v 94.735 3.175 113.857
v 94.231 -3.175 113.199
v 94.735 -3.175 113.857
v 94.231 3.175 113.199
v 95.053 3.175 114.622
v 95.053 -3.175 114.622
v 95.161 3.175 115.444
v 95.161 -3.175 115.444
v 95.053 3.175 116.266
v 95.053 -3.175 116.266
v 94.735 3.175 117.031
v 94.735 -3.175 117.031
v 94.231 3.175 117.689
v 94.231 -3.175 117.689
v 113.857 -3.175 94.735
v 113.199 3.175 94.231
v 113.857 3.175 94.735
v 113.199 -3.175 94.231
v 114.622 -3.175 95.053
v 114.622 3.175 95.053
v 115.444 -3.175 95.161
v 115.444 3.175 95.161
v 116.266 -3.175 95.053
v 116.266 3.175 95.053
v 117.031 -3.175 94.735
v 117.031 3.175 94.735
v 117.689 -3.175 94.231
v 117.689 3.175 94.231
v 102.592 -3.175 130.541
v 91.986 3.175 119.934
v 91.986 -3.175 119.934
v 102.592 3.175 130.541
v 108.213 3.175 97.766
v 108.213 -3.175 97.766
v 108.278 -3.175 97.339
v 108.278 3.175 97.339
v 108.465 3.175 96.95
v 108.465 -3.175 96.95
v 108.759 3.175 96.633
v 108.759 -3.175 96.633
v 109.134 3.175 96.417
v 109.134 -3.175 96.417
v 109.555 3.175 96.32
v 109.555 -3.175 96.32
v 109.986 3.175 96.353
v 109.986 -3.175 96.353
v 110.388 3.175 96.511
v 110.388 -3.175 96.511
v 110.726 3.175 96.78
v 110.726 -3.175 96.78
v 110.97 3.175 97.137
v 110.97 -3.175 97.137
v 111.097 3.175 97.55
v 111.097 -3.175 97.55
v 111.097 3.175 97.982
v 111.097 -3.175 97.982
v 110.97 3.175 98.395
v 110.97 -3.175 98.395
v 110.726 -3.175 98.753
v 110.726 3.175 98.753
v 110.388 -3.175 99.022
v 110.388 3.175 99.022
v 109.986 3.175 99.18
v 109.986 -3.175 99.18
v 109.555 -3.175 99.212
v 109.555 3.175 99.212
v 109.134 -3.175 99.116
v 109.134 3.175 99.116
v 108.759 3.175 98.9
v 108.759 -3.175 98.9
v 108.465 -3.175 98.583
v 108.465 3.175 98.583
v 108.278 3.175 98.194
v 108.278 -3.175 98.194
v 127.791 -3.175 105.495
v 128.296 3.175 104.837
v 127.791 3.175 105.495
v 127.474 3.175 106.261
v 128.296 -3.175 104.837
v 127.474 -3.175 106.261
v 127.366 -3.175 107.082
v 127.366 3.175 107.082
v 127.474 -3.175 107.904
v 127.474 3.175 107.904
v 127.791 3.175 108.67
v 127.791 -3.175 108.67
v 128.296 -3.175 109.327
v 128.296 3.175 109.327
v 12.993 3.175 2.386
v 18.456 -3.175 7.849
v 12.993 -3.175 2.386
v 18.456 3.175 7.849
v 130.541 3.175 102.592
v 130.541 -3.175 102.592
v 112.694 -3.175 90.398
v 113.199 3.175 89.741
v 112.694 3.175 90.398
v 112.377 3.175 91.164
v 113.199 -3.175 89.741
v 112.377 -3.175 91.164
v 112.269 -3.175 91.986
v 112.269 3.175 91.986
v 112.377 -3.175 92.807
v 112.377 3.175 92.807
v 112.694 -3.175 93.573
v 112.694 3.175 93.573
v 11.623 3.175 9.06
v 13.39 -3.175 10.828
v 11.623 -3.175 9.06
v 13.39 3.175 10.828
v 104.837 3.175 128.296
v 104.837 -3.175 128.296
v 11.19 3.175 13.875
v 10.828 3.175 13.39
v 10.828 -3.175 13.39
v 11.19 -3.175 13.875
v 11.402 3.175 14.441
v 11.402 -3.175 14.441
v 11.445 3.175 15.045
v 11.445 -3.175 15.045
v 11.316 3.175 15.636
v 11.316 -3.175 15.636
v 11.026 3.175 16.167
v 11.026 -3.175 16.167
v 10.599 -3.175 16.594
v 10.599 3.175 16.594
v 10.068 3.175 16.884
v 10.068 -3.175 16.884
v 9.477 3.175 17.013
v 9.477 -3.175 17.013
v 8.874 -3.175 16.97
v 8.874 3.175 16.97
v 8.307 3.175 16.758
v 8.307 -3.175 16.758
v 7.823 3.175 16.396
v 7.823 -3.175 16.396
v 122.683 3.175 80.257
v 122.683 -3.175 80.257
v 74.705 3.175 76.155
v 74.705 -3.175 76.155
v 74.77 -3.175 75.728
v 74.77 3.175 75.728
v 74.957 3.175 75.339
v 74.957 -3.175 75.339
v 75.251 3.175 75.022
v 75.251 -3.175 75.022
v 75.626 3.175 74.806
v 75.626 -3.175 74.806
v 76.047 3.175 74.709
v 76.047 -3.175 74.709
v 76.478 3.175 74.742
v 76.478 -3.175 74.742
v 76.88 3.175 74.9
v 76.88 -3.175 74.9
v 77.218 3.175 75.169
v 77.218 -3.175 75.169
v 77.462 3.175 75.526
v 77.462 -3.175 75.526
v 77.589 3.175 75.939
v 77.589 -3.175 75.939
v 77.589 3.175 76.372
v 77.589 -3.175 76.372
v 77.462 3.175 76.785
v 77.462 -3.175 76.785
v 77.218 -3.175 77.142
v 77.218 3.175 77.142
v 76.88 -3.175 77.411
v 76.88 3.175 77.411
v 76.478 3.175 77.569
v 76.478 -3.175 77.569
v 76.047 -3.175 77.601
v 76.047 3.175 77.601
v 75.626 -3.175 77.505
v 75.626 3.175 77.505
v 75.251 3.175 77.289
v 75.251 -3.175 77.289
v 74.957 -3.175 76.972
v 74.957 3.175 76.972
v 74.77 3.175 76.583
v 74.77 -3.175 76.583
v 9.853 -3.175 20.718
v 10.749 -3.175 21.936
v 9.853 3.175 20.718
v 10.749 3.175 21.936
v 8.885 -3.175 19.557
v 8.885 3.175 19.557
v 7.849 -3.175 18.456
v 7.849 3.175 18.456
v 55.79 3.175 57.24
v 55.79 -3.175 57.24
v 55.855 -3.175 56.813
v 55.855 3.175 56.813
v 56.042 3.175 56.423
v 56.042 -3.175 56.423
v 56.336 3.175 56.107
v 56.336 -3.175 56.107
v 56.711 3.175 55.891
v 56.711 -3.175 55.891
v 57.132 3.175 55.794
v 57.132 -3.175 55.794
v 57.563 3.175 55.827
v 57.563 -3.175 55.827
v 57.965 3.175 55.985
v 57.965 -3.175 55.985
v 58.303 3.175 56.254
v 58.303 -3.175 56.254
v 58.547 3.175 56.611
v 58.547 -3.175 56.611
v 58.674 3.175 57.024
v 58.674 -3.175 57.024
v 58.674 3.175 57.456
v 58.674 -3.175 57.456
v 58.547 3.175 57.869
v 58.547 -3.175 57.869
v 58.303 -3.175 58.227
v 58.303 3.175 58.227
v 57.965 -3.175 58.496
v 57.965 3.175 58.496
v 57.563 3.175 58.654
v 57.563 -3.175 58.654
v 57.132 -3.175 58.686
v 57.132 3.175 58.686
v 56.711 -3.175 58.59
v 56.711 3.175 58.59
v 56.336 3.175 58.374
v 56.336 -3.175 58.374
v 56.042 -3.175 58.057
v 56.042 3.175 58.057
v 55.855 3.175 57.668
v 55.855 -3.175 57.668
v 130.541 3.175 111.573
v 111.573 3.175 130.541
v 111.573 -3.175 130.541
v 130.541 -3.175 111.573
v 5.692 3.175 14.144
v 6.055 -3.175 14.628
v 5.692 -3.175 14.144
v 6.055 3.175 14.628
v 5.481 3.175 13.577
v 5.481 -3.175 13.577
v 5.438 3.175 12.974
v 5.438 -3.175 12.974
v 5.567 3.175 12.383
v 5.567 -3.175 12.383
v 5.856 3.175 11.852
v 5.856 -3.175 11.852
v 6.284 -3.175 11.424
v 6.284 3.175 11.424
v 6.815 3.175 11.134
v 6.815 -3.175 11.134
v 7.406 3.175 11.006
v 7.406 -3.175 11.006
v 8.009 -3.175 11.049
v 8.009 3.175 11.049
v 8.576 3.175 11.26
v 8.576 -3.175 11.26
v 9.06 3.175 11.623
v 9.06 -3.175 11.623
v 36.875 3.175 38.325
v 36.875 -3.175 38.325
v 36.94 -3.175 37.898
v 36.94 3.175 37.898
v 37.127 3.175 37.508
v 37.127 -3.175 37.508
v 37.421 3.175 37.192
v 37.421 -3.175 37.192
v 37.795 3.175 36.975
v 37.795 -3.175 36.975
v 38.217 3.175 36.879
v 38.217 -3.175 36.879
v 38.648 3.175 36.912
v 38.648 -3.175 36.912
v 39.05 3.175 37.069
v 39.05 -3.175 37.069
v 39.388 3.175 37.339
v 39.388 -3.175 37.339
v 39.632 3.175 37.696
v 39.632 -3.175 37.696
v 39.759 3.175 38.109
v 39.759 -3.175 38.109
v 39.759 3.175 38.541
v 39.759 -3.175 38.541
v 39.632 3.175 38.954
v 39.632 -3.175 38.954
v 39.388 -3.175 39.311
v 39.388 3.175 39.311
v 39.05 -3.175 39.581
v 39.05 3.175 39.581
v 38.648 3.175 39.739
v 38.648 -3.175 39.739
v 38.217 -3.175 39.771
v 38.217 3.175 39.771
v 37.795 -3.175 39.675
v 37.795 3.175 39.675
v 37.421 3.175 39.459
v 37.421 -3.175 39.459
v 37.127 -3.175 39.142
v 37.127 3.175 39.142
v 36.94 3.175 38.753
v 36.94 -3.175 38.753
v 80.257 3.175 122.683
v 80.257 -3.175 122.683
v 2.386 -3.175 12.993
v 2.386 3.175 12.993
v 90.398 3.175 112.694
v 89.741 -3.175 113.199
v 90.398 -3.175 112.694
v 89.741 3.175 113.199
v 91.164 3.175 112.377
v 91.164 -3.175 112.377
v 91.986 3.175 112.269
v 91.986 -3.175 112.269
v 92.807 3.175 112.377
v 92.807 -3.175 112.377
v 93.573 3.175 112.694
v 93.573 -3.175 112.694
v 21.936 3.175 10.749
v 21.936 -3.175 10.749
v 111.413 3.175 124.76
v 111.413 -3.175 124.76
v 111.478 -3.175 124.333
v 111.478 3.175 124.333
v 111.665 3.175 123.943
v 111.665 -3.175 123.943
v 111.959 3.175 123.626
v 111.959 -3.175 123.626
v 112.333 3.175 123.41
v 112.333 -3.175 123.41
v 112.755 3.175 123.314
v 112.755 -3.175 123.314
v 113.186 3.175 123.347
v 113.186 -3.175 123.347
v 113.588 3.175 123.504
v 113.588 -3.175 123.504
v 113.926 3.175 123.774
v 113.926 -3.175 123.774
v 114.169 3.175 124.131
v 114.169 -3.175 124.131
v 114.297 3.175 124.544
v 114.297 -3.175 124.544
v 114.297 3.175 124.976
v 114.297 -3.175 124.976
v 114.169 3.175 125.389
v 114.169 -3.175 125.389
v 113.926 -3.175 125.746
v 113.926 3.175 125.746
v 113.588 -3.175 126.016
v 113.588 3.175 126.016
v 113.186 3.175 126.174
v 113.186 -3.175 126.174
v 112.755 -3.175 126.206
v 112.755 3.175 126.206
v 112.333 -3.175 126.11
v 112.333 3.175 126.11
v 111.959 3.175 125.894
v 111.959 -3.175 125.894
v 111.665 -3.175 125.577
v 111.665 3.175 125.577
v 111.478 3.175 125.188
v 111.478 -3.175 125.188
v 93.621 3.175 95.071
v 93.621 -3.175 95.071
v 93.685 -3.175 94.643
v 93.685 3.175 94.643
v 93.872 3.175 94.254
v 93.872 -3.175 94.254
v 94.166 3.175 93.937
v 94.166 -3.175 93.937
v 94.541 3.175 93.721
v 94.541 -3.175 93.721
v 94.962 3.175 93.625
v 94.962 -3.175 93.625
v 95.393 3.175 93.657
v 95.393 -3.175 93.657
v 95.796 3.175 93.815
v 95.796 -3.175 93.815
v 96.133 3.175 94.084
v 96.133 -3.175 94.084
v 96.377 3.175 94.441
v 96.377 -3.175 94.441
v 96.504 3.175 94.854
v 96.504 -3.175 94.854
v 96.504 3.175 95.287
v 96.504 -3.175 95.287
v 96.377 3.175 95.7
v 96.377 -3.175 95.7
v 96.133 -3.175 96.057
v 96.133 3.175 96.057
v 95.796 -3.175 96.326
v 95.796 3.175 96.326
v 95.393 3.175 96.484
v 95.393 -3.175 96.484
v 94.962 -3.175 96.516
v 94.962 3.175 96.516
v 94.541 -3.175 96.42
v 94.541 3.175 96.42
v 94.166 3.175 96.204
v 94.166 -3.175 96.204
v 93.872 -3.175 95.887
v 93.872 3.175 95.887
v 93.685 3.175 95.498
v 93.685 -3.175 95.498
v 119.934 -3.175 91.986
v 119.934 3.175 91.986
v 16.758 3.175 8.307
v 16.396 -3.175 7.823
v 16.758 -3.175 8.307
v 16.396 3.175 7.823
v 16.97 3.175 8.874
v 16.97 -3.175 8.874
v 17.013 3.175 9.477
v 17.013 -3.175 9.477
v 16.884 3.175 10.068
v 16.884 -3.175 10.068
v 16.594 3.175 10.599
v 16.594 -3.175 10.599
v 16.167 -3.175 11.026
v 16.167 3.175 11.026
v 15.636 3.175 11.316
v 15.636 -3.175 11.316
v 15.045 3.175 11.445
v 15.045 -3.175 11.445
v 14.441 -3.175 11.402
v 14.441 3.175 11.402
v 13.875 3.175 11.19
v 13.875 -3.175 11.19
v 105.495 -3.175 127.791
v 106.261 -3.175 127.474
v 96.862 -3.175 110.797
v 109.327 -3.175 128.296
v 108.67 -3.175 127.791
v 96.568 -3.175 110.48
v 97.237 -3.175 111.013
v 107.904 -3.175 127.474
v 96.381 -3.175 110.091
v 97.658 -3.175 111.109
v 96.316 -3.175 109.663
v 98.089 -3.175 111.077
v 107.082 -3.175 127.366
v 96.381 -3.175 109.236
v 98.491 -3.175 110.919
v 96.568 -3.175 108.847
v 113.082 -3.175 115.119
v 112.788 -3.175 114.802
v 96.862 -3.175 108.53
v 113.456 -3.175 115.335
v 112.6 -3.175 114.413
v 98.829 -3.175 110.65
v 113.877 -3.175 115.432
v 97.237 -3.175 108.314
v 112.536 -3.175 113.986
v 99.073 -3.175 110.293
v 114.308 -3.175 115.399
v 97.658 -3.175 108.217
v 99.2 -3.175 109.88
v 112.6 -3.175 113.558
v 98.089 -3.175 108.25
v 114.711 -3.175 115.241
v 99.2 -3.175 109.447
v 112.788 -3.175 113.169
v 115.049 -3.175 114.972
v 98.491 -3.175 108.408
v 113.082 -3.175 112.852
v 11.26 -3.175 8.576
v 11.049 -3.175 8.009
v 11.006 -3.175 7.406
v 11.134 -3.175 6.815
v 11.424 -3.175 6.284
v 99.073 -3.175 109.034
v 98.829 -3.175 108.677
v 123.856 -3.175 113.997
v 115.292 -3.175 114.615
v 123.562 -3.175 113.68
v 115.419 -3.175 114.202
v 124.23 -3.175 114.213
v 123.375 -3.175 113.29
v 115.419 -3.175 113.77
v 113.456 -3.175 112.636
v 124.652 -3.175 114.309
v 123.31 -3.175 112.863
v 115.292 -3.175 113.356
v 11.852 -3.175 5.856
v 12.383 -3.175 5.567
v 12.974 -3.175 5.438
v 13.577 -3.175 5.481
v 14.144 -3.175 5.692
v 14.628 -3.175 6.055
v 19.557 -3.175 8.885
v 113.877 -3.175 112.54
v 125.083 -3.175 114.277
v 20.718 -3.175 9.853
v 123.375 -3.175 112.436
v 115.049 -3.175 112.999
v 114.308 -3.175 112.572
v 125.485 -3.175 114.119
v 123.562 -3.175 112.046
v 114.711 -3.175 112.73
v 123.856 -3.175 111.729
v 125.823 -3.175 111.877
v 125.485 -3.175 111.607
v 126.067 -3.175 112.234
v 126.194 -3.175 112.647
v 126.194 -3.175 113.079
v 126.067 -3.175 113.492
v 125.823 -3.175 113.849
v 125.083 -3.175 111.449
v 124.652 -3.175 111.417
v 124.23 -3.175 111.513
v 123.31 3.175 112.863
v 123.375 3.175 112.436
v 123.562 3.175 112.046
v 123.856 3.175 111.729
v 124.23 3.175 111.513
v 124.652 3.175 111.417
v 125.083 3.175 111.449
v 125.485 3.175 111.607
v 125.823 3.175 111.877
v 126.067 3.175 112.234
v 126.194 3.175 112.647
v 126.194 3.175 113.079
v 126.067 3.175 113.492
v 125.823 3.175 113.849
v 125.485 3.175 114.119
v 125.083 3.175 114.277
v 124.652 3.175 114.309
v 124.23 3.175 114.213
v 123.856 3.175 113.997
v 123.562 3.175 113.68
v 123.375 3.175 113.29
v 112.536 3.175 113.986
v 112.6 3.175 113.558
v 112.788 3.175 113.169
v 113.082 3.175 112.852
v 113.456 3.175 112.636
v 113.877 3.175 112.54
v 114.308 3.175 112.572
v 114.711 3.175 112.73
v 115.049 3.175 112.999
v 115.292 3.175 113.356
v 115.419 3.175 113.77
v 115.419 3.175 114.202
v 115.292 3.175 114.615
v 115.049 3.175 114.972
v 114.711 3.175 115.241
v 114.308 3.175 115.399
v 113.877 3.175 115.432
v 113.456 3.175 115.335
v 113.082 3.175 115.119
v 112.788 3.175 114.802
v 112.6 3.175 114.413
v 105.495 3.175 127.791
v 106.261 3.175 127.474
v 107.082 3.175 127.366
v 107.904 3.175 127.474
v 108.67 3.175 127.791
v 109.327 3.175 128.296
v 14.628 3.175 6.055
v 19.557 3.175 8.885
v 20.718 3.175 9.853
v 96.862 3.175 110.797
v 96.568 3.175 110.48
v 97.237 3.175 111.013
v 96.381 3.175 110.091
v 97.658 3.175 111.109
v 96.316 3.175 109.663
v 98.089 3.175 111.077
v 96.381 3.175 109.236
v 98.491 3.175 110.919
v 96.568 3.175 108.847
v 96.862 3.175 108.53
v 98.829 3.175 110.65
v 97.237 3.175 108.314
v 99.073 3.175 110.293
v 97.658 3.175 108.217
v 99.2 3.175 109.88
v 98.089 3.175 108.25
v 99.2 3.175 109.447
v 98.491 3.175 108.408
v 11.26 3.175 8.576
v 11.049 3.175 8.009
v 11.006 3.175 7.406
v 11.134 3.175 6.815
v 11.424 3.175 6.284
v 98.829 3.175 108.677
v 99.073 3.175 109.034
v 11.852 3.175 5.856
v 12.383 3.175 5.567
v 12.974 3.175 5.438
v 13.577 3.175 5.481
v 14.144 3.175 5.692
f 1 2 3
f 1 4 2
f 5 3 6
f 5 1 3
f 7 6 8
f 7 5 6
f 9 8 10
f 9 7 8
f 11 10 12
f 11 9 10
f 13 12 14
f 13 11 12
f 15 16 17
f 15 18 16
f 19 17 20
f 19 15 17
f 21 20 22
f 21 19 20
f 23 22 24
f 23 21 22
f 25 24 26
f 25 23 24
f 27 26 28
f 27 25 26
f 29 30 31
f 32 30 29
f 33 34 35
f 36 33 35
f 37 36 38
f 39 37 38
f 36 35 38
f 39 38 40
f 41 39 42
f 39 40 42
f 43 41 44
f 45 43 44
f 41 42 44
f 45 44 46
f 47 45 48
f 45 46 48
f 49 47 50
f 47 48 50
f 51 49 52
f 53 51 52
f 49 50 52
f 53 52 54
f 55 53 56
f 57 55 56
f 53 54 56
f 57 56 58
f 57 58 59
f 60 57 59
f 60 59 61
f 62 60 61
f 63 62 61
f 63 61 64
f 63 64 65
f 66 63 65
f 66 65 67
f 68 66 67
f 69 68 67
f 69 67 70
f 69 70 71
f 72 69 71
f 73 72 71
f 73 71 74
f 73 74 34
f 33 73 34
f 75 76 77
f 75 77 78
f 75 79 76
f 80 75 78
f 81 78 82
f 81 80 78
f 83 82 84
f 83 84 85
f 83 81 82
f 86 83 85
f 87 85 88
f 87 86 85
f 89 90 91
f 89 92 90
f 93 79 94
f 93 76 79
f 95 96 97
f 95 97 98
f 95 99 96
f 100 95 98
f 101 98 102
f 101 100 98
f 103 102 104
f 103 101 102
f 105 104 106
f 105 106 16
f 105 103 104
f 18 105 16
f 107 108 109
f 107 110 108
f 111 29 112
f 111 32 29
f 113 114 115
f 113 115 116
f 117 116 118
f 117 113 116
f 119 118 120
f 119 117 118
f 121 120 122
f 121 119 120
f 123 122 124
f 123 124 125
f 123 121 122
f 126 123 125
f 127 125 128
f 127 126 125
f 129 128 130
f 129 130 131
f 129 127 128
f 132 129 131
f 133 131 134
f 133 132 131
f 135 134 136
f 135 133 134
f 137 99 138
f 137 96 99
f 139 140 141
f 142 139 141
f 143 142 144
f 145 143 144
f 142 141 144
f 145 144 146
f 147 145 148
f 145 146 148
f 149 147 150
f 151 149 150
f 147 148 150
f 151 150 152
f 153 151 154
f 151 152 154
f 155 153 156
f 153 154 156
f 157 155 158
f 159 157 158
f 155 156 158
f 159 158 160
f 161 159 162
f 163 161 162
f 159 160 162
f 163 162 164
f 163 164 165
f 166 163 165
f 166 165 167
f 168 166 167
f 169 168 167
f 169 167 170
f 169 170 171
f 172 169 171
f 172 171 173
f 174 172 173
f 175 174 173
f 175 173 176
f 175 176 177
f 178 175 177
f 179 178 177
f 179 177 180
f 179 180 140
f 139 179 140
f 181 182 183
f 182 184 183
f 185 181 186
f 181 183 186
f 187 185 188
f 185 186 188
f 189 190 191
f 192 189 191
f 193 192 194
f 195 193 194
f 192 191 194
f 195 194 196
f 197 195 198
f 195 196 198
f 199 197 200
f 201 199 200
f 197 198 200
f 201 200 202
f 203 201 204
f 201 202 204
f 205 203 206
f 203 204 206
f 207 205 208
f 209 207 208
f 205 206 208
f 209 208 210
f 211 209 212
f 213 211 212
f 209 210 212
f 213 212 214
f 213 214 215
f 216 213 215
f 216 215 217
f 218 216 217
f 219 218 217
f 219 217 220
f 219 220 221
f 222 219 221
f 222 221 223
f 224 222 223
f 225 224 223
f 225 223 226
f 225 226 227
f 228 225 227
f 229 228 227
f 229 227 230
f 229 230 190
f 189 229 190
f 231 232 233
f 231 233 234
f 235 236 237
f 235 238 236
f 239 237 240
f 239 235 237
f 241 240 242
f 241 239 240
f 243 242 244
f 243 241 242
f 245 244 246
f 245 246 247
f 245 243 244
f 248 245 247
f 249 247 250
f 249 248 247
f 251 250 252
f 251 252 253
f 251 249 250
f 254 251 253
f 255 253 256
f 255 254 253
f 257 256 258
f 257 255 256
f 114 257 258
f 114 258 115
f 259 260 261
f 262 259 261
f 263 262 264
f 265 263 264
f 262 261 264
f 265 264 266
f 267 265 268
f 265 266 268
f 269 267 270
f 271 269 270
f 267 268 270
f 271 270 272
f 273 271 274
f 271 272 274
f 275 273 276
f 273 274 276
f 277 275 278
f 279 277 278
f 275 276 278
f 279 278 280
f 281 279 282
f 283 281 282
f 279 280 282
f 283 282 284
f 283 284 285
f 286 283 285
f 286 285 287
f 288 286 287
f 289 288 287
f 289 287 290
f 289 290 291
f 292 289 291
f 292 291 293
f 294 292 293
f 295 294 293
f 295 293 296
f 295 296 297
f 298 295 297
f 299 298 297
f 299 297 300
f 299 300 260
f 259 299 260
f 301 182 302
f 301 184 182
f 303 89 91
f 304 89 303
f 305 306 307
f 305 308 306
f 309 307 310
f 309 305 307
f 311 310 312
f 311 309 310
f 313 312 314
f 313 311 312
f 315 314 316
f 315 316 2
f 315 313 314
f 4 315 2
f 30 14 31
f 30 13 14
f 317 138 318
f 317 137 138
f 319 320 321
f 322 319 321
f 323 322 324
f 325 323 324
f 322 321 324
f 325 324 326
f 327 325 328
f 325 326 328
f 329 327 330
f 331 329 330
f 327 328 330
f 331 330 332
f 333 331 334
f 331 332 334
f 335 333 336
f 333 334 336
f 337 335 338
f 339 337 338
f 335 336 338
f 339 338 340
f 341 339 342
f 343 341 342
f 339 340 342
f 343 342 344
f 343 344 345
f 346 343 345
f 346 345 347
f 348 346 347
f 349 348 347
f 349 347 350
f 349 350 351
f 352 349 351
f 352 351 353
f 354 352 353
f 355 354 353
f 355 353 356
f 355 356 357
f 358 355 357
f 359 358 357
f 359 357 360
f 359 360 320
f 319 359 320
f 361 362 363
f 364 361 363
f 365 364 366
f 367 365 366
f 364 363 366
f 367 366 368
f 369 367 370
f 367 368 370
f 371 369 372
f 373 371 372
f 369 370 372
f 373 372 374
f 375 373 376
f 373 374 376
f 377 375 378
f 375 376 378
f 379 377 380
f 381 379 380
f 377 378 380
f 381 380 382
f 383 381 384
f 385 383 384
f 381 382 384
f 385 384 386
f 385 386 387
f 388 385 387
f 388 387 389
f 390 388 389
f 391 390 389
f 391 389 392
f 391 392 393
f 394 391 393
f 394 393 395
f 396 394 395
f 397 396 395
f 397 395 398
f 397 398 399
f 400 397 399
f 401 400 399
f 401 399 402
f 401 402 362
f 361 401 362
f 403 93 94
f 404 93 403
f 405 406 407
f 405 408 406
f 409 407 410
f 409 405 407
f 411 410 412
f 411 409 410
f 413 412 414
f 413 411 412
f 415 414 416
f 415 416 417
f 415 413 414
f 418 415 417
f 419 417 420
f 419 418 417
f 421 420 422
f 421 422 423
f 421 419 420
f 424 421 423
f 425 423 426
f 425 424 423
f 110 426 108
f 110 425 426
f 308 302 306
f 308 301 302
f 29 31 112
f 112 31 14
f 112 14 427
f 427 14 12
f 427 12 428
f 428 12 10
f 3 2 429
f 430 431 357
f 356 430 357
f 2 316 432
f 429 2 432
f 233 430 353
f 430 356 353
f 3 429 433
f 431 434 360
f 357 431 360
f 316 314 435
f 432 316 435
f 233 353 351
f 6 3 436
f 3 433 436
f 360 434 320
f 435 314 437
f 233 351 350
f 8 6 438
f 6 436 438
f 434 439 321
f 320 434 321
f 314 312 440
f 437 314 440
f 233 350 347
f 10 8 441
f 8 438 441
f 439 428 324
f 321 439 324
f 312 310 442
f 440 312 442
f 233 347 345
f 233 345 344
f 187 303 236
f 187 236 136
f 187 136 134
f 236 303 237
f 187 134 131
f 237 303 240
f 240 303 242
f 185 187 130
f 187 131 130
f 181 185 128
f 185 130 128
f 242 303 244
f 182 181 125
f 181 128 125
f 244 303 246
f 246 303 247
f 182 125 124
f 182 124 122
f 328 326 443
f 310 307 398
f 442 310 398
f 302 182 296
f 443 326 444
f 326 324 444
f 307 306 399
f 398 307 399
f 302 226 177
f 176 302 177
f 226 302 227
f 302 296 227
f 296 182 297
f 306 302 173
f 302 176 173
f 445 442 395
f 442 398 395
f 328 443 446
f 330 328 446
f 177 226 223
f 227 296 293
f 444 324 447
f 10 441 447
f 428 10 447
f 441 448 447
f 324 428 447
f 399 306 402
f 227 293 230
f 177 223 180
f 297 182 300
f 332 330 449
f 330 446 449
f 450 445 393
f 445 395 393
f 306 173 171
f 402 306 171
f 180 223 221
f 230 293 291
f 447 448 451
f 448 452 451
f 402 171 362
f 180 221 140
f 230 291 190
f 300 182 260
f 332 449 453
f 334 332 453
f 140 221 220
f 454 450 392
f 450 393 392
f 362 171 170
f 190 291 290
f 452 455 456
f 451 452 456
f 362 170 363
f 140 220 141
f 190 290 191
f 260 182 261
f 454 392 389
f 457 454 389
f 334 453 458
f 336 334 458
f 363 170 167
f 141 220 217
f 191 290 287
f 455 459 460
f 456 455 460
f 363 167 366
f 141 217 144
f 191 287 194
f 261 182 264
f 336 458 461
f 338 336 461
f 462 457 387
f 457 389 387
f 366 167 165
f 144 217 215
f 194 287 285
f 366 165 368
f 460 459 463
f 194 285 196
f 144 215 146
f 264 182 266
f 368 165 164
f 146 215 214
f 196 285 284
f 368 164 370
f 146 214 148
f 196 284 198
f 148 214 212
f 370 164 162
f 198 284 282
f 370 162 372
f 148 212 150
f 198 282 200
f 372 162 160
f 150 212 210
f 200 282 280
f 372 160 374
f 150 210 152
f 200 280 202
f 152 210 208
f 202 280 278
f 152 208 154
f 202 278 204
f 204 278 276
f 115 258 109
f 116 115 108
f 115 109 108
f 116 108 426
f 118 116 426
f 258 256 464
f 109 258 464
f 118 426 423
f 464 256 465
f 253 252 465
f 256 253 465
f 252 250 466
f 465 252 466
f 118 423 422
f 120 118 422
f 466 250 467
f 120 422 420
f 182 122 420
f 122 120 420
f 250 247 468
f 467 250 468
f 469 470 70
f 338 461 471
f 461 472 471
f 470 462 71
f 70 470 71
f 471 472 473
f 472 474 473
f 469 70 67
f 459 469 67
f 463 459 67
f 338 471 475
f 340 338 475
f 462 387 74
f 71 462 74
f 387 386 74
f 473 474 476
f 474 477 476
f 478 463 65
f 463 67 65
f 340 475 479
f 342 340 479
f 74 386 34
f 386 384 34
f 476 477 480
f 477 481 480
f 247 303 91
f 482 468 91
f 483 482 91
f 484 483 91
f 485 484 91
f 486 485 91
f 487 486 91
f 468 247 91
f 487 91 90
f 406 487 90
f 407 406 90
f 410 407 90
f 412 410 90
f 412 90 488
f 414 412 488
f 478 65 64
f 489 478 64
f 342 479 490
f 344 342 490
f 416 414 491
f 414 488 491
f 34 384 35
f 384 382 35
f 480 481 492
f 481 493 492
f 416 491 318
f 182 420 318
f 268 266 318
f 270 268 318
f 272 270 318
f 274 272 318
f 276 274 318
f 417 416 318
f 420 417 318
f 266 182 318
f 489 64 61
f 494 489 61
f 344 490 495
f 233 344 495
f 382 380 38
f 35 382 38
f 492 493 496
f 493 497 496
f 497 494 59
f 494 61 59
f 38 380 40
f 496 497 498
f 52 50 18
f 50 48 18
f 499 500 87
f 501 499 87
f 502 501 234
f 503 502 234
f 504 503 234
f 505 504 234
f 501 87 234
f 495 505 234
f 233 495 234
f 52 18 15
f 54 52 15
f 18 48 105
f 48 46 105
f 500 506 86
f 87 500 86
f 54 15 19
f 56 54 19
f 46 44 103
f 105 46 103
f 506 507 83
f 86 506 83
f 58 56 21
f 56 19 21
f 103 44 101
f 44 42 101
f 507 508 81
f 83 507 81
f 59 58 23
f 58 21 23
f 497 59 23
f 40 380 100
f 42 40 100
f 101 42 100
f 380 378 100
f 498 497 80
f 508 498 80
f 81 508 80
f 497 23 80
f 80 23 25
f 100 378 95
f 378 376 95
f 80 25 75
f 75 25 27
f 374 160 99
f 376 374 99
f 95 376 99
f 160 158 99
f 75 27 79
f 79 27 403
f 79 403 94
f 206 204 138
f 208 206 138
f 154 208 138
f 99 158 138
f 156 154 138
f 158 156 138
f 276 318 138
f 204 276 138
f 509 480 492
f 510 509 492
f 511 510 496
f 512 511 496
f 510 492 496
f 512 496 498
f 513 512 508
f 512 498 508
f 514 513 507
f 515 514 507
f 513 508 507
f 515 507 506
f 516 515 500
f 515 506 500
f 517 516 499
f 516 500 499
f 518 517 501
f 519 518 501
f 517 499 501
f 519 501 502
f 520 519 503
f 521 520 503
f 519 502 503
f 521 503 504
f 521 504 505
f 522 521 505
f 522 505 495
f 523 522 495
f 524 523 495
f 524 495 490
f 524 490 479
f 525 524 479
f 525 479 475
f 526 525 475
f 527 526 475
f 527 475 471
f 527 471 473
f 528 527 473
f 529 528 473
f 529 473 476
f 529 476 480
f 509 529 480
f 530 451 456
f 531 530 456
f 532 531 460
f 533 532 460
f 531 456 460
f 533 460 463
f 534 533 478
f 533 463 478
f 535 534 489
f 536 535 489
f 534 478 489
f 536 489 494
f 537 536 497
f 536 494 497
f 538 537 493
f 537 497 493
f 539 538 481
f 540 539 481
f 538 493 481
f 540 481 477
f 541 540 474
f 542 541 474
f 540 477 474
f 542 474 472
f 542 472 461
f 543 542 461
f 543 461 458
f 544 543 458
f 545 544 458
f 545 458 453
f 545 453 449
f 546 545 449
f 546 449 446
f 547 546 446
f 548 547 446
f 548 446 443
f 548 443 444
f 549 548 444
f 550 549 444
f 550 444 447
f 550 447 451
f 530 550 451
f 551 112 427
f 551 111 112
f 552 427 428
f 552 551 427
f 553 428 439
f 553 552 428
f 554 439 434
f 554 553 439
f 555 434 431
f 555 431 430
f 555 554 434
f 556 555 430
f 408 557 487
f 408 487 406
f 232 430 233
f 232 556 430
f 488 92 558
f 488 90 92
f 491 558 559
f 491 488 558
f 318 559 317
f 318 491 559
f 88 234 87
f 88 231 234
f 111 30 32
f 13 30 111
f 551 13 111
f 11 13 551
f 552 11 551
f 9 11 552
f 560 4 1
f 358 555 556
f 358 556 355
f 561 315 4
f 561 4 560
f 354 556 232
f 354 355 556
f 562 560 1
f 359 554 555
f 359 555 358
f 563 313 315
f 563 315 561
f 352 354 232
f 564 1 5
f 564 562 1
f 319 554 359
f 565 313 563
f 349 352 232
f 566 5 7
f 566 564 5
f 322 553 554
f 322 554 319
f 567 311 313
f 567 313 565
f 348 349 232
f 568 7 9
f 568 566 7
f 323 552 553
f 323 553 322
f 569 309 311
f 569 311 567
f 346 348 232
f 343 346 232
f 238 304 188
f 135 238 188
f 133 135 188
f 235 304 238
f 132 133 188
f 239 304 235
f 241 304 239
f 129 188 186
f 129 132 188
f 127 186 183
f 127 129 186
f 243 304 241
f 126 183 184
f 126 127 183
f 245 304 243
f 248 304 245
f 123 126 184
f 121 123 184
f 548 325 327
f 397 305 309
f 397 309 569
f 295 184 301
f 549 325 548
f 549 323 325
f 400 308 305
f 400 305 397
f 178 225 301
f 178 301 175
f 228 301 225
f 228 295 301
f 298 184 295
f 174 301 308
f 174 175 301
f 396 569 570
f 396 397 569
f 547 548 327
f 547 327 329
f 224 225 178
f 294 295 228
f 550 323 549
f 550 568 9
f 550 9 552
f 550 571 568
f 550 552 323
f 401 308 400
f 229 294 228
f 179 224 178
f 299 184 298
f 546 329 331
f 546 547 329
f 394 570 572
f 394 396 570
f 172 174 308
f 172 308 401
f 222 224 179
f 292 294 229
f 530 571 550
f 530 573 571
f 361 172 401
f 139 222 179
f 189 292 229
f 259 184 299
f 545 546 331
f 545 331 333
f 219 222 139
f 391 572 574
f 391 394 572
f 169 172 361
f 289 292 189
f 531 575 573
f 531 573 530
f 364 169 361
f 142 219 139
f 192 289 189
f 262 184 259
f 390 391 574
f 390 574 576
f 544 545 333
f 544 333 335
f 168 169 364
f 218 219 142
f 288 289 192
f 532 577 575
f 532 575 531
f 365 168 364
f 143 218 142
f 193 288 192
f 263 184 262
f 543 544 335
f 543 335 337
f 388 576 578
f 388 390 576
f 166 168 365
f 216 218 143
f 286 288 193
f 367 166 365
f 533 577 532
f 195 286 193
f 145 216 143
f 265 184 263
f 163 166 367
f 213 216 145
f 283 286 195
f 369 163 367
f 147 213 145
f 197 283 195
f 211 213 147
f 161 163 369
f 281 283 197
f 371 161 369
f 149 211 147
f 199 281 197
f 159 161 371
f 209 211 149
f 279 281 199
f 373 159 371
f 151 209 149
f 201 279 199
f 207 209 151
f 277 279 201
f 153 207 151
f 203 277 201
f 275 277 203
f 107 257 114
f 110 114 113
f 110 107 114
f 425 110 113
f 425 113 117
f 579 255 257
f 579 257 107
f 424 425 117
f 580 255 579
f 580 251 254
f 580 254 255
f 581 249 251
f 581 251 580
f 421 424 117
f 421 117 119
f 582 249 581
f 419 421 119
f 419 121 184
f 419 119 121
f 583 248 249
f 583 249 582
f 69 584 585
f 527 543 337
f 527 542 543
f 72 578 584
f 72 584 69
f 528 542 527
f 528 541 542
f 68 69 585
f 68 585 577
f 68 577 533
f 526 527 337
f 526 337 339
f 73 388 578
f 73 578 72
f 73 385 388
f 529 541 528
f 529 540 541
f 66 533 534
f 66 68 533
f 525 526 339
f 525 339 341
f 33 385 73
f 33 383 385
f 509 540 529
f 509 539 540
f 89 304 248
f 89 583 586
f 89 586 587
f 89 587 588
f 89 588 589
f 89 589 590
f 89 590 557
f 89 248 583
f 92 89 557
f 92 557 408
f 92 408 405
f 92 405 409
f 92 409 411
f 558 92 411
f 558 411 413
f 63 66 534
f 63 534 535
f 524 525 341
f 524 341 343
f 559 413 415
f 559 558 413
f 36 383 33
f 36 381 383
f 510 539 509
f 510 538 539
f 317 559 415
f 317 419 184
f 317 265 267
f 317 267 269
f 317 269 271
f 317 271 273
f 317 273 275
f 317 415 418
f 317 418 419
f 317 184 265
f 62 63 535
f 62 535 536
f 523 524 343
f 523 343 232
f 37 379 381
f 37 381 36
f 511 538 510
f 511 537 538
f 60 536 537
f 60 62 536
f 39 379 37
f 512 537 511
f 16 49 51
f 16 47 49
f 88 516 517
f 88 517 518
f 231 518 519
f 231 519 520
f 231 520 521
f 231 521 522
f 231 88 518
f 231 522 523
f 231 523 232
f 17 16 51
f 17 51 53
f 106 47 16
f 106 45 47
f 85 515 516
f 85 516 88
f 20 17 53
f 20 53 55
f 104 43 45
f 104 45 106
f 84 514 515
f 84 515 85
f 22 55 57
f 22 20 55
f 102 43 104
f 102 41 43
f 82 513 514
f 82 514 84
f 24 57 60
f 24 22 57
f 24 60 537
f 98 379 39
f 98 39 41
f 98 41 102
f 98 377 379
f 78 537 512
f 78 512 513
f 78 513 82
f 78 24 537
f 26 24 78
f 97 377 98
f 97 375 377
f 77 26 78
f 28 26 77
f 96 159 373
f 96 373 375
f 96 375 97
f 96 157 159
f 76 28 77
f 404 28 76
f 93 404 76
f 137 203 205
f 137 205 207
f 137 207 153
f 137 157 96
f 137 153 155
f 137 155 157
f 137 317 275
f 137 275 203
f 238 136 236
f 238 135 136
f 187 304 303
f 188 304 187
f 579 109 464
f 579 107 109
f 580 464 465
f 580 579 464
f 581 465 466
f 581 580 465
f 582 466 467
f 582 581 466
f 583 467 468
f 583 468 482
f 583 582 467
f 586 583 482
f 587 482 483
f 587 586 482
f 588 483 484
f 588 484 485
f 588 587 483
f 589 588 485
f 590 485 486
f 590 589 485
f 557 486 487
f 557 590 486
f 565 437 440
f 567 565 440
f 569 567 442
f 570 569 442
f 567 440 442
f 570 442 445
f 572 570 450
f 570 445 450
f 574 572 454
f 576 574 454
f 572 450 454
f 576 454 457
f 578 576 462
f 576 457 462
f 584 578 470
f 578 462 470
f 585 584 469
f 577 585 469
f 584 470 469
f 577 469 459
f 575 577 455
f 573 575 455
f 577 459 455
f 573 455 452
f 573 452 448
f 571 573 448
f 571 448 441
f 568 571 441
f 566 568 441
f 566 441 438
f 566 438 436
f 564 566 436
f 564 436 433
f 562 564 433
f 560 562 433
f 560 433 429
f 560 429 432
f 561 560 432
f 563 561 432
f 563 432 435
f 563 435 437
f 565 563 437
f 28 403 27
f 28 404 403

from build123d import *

# Parameters (mm, degrees)
BOSS_EXTRUDE1_DEPTH    = 3.175
FILLET1_R              = 25
M2_5_CLEARANCE_HOLE1_D = 2.9
FILLET2_R              = 3.175


with BuildPart() as part:
    # Sketch1 → Boss-Extrude1 (new, symmetric)
    with BuildSketch(Plane(origin=(0, 0, 0), x_dir=(1, 0, 0), z_dir=(0, 1, 0))):
        Polygon((12.993087104, -2.386485387), (2.386485387, -12.993087104), (9.457553198, -20.064154916), (80.256619665, -122.683026536), (91.985753398, -110.953892803), (96.475881458, -115.444020863), (91.985753398, -119.934148924), (102.592355115, -130.540750642), (107.082483176, -126.050622581), (111.572611236, -130.540750642), (130.540750642, -111.572611236), (126.050622581, -107.082483176), (130.540750642, -102.592355115), (119.934148924, -91.985753398), (115.444020863, -96.475881458), (110.953892803, -91.985753398), (122.683026536, -80.256619665), (20.064154916, -9.457553198), align=None)
        with BuildLine():
            Line((9.060159187, -11.622714162), (10.82792614, -13.390481115))
            ThreePointArc((10.82792614, -13.390481115), (10.82792614, -16.395684935), (7.82272232, -16.395684935))
            Line((7.82272232, -16.395684935), (6.054955367, -14.627917982))
            ThreePointArc((6.054955367, -14.627917982), (6.054955367, -11.622714162), (9.060159187, -11.622714162))
        make_face(mode=Mode.SUBTRACT)
        with BuildLine():
            Line((14.627917982, -6.054955367), (16.395684935, -7.82272232))
            ThreePointArc((16.395684935, -7.82272232), (16.395684935, -10.82792614), (13.390481115, -10.82792614))
            Line((13.390481115, -10.82792614), (11.622714162, -9.060159187))
            ThreePointArc((11.622714162, -9.060159187), (11.622714162, -6.054955367), (14.627917982, -6.054955367))
        make_face(mode=Mode.SUBTRACT)
    extrude(amount=BOSS_EXTRUDE1_DEPTH, both=True)

    # Fillet1
    fillet1_edges = [part.edges().sort_by_distance(p)[0] for p in [
        (9.457553198, 0, 20.064154916),
        (20.064154916, 0, 9.457553198),
    ]]
    fillet(fillet1_edges, radius=FILLET1_R)

    # M2.5 Clearance Hole1 (through all)
    with Locations(Plane(origin=(0, 3.175, 0), x_dir=(1, 0, 0), z_dir=(0, 1, 0))):
        with Locations((97.766351334, -109.663422927), (109.663422927, -97.766351334), (112.863081112, -124.760152706), (124.760152706, -112.863081112), (38.32518754, -38.32518754), (57.240293937, -57.240293937), (76.155400334, -76.155400334), (95.070506731, -95.070506731), (113.985613127, -113.985613127)):
            Hole(M2_5_CLEARANCE_HOLE1_D / 2)

    # Fillet2
    fillet2_edges = [part.edges().sort_by_distance(p)[0] for p in [
        (110.953892803, 0, 91.985753398),
        (115.444020863, 0, 96.475881458),
        (126.050622581, 0, 107.082483176),
        (107.082483176, 0, 126.050622581),
        (96.475881458, 0, 115.444020863),
        (91.985753398, 0, 110.953892803),
    ]]
    fillet(fillet2_edges, radius=FILLET2_R - 0.0001)  # a hair under: the kernel refuses the full size


solid = part.part
